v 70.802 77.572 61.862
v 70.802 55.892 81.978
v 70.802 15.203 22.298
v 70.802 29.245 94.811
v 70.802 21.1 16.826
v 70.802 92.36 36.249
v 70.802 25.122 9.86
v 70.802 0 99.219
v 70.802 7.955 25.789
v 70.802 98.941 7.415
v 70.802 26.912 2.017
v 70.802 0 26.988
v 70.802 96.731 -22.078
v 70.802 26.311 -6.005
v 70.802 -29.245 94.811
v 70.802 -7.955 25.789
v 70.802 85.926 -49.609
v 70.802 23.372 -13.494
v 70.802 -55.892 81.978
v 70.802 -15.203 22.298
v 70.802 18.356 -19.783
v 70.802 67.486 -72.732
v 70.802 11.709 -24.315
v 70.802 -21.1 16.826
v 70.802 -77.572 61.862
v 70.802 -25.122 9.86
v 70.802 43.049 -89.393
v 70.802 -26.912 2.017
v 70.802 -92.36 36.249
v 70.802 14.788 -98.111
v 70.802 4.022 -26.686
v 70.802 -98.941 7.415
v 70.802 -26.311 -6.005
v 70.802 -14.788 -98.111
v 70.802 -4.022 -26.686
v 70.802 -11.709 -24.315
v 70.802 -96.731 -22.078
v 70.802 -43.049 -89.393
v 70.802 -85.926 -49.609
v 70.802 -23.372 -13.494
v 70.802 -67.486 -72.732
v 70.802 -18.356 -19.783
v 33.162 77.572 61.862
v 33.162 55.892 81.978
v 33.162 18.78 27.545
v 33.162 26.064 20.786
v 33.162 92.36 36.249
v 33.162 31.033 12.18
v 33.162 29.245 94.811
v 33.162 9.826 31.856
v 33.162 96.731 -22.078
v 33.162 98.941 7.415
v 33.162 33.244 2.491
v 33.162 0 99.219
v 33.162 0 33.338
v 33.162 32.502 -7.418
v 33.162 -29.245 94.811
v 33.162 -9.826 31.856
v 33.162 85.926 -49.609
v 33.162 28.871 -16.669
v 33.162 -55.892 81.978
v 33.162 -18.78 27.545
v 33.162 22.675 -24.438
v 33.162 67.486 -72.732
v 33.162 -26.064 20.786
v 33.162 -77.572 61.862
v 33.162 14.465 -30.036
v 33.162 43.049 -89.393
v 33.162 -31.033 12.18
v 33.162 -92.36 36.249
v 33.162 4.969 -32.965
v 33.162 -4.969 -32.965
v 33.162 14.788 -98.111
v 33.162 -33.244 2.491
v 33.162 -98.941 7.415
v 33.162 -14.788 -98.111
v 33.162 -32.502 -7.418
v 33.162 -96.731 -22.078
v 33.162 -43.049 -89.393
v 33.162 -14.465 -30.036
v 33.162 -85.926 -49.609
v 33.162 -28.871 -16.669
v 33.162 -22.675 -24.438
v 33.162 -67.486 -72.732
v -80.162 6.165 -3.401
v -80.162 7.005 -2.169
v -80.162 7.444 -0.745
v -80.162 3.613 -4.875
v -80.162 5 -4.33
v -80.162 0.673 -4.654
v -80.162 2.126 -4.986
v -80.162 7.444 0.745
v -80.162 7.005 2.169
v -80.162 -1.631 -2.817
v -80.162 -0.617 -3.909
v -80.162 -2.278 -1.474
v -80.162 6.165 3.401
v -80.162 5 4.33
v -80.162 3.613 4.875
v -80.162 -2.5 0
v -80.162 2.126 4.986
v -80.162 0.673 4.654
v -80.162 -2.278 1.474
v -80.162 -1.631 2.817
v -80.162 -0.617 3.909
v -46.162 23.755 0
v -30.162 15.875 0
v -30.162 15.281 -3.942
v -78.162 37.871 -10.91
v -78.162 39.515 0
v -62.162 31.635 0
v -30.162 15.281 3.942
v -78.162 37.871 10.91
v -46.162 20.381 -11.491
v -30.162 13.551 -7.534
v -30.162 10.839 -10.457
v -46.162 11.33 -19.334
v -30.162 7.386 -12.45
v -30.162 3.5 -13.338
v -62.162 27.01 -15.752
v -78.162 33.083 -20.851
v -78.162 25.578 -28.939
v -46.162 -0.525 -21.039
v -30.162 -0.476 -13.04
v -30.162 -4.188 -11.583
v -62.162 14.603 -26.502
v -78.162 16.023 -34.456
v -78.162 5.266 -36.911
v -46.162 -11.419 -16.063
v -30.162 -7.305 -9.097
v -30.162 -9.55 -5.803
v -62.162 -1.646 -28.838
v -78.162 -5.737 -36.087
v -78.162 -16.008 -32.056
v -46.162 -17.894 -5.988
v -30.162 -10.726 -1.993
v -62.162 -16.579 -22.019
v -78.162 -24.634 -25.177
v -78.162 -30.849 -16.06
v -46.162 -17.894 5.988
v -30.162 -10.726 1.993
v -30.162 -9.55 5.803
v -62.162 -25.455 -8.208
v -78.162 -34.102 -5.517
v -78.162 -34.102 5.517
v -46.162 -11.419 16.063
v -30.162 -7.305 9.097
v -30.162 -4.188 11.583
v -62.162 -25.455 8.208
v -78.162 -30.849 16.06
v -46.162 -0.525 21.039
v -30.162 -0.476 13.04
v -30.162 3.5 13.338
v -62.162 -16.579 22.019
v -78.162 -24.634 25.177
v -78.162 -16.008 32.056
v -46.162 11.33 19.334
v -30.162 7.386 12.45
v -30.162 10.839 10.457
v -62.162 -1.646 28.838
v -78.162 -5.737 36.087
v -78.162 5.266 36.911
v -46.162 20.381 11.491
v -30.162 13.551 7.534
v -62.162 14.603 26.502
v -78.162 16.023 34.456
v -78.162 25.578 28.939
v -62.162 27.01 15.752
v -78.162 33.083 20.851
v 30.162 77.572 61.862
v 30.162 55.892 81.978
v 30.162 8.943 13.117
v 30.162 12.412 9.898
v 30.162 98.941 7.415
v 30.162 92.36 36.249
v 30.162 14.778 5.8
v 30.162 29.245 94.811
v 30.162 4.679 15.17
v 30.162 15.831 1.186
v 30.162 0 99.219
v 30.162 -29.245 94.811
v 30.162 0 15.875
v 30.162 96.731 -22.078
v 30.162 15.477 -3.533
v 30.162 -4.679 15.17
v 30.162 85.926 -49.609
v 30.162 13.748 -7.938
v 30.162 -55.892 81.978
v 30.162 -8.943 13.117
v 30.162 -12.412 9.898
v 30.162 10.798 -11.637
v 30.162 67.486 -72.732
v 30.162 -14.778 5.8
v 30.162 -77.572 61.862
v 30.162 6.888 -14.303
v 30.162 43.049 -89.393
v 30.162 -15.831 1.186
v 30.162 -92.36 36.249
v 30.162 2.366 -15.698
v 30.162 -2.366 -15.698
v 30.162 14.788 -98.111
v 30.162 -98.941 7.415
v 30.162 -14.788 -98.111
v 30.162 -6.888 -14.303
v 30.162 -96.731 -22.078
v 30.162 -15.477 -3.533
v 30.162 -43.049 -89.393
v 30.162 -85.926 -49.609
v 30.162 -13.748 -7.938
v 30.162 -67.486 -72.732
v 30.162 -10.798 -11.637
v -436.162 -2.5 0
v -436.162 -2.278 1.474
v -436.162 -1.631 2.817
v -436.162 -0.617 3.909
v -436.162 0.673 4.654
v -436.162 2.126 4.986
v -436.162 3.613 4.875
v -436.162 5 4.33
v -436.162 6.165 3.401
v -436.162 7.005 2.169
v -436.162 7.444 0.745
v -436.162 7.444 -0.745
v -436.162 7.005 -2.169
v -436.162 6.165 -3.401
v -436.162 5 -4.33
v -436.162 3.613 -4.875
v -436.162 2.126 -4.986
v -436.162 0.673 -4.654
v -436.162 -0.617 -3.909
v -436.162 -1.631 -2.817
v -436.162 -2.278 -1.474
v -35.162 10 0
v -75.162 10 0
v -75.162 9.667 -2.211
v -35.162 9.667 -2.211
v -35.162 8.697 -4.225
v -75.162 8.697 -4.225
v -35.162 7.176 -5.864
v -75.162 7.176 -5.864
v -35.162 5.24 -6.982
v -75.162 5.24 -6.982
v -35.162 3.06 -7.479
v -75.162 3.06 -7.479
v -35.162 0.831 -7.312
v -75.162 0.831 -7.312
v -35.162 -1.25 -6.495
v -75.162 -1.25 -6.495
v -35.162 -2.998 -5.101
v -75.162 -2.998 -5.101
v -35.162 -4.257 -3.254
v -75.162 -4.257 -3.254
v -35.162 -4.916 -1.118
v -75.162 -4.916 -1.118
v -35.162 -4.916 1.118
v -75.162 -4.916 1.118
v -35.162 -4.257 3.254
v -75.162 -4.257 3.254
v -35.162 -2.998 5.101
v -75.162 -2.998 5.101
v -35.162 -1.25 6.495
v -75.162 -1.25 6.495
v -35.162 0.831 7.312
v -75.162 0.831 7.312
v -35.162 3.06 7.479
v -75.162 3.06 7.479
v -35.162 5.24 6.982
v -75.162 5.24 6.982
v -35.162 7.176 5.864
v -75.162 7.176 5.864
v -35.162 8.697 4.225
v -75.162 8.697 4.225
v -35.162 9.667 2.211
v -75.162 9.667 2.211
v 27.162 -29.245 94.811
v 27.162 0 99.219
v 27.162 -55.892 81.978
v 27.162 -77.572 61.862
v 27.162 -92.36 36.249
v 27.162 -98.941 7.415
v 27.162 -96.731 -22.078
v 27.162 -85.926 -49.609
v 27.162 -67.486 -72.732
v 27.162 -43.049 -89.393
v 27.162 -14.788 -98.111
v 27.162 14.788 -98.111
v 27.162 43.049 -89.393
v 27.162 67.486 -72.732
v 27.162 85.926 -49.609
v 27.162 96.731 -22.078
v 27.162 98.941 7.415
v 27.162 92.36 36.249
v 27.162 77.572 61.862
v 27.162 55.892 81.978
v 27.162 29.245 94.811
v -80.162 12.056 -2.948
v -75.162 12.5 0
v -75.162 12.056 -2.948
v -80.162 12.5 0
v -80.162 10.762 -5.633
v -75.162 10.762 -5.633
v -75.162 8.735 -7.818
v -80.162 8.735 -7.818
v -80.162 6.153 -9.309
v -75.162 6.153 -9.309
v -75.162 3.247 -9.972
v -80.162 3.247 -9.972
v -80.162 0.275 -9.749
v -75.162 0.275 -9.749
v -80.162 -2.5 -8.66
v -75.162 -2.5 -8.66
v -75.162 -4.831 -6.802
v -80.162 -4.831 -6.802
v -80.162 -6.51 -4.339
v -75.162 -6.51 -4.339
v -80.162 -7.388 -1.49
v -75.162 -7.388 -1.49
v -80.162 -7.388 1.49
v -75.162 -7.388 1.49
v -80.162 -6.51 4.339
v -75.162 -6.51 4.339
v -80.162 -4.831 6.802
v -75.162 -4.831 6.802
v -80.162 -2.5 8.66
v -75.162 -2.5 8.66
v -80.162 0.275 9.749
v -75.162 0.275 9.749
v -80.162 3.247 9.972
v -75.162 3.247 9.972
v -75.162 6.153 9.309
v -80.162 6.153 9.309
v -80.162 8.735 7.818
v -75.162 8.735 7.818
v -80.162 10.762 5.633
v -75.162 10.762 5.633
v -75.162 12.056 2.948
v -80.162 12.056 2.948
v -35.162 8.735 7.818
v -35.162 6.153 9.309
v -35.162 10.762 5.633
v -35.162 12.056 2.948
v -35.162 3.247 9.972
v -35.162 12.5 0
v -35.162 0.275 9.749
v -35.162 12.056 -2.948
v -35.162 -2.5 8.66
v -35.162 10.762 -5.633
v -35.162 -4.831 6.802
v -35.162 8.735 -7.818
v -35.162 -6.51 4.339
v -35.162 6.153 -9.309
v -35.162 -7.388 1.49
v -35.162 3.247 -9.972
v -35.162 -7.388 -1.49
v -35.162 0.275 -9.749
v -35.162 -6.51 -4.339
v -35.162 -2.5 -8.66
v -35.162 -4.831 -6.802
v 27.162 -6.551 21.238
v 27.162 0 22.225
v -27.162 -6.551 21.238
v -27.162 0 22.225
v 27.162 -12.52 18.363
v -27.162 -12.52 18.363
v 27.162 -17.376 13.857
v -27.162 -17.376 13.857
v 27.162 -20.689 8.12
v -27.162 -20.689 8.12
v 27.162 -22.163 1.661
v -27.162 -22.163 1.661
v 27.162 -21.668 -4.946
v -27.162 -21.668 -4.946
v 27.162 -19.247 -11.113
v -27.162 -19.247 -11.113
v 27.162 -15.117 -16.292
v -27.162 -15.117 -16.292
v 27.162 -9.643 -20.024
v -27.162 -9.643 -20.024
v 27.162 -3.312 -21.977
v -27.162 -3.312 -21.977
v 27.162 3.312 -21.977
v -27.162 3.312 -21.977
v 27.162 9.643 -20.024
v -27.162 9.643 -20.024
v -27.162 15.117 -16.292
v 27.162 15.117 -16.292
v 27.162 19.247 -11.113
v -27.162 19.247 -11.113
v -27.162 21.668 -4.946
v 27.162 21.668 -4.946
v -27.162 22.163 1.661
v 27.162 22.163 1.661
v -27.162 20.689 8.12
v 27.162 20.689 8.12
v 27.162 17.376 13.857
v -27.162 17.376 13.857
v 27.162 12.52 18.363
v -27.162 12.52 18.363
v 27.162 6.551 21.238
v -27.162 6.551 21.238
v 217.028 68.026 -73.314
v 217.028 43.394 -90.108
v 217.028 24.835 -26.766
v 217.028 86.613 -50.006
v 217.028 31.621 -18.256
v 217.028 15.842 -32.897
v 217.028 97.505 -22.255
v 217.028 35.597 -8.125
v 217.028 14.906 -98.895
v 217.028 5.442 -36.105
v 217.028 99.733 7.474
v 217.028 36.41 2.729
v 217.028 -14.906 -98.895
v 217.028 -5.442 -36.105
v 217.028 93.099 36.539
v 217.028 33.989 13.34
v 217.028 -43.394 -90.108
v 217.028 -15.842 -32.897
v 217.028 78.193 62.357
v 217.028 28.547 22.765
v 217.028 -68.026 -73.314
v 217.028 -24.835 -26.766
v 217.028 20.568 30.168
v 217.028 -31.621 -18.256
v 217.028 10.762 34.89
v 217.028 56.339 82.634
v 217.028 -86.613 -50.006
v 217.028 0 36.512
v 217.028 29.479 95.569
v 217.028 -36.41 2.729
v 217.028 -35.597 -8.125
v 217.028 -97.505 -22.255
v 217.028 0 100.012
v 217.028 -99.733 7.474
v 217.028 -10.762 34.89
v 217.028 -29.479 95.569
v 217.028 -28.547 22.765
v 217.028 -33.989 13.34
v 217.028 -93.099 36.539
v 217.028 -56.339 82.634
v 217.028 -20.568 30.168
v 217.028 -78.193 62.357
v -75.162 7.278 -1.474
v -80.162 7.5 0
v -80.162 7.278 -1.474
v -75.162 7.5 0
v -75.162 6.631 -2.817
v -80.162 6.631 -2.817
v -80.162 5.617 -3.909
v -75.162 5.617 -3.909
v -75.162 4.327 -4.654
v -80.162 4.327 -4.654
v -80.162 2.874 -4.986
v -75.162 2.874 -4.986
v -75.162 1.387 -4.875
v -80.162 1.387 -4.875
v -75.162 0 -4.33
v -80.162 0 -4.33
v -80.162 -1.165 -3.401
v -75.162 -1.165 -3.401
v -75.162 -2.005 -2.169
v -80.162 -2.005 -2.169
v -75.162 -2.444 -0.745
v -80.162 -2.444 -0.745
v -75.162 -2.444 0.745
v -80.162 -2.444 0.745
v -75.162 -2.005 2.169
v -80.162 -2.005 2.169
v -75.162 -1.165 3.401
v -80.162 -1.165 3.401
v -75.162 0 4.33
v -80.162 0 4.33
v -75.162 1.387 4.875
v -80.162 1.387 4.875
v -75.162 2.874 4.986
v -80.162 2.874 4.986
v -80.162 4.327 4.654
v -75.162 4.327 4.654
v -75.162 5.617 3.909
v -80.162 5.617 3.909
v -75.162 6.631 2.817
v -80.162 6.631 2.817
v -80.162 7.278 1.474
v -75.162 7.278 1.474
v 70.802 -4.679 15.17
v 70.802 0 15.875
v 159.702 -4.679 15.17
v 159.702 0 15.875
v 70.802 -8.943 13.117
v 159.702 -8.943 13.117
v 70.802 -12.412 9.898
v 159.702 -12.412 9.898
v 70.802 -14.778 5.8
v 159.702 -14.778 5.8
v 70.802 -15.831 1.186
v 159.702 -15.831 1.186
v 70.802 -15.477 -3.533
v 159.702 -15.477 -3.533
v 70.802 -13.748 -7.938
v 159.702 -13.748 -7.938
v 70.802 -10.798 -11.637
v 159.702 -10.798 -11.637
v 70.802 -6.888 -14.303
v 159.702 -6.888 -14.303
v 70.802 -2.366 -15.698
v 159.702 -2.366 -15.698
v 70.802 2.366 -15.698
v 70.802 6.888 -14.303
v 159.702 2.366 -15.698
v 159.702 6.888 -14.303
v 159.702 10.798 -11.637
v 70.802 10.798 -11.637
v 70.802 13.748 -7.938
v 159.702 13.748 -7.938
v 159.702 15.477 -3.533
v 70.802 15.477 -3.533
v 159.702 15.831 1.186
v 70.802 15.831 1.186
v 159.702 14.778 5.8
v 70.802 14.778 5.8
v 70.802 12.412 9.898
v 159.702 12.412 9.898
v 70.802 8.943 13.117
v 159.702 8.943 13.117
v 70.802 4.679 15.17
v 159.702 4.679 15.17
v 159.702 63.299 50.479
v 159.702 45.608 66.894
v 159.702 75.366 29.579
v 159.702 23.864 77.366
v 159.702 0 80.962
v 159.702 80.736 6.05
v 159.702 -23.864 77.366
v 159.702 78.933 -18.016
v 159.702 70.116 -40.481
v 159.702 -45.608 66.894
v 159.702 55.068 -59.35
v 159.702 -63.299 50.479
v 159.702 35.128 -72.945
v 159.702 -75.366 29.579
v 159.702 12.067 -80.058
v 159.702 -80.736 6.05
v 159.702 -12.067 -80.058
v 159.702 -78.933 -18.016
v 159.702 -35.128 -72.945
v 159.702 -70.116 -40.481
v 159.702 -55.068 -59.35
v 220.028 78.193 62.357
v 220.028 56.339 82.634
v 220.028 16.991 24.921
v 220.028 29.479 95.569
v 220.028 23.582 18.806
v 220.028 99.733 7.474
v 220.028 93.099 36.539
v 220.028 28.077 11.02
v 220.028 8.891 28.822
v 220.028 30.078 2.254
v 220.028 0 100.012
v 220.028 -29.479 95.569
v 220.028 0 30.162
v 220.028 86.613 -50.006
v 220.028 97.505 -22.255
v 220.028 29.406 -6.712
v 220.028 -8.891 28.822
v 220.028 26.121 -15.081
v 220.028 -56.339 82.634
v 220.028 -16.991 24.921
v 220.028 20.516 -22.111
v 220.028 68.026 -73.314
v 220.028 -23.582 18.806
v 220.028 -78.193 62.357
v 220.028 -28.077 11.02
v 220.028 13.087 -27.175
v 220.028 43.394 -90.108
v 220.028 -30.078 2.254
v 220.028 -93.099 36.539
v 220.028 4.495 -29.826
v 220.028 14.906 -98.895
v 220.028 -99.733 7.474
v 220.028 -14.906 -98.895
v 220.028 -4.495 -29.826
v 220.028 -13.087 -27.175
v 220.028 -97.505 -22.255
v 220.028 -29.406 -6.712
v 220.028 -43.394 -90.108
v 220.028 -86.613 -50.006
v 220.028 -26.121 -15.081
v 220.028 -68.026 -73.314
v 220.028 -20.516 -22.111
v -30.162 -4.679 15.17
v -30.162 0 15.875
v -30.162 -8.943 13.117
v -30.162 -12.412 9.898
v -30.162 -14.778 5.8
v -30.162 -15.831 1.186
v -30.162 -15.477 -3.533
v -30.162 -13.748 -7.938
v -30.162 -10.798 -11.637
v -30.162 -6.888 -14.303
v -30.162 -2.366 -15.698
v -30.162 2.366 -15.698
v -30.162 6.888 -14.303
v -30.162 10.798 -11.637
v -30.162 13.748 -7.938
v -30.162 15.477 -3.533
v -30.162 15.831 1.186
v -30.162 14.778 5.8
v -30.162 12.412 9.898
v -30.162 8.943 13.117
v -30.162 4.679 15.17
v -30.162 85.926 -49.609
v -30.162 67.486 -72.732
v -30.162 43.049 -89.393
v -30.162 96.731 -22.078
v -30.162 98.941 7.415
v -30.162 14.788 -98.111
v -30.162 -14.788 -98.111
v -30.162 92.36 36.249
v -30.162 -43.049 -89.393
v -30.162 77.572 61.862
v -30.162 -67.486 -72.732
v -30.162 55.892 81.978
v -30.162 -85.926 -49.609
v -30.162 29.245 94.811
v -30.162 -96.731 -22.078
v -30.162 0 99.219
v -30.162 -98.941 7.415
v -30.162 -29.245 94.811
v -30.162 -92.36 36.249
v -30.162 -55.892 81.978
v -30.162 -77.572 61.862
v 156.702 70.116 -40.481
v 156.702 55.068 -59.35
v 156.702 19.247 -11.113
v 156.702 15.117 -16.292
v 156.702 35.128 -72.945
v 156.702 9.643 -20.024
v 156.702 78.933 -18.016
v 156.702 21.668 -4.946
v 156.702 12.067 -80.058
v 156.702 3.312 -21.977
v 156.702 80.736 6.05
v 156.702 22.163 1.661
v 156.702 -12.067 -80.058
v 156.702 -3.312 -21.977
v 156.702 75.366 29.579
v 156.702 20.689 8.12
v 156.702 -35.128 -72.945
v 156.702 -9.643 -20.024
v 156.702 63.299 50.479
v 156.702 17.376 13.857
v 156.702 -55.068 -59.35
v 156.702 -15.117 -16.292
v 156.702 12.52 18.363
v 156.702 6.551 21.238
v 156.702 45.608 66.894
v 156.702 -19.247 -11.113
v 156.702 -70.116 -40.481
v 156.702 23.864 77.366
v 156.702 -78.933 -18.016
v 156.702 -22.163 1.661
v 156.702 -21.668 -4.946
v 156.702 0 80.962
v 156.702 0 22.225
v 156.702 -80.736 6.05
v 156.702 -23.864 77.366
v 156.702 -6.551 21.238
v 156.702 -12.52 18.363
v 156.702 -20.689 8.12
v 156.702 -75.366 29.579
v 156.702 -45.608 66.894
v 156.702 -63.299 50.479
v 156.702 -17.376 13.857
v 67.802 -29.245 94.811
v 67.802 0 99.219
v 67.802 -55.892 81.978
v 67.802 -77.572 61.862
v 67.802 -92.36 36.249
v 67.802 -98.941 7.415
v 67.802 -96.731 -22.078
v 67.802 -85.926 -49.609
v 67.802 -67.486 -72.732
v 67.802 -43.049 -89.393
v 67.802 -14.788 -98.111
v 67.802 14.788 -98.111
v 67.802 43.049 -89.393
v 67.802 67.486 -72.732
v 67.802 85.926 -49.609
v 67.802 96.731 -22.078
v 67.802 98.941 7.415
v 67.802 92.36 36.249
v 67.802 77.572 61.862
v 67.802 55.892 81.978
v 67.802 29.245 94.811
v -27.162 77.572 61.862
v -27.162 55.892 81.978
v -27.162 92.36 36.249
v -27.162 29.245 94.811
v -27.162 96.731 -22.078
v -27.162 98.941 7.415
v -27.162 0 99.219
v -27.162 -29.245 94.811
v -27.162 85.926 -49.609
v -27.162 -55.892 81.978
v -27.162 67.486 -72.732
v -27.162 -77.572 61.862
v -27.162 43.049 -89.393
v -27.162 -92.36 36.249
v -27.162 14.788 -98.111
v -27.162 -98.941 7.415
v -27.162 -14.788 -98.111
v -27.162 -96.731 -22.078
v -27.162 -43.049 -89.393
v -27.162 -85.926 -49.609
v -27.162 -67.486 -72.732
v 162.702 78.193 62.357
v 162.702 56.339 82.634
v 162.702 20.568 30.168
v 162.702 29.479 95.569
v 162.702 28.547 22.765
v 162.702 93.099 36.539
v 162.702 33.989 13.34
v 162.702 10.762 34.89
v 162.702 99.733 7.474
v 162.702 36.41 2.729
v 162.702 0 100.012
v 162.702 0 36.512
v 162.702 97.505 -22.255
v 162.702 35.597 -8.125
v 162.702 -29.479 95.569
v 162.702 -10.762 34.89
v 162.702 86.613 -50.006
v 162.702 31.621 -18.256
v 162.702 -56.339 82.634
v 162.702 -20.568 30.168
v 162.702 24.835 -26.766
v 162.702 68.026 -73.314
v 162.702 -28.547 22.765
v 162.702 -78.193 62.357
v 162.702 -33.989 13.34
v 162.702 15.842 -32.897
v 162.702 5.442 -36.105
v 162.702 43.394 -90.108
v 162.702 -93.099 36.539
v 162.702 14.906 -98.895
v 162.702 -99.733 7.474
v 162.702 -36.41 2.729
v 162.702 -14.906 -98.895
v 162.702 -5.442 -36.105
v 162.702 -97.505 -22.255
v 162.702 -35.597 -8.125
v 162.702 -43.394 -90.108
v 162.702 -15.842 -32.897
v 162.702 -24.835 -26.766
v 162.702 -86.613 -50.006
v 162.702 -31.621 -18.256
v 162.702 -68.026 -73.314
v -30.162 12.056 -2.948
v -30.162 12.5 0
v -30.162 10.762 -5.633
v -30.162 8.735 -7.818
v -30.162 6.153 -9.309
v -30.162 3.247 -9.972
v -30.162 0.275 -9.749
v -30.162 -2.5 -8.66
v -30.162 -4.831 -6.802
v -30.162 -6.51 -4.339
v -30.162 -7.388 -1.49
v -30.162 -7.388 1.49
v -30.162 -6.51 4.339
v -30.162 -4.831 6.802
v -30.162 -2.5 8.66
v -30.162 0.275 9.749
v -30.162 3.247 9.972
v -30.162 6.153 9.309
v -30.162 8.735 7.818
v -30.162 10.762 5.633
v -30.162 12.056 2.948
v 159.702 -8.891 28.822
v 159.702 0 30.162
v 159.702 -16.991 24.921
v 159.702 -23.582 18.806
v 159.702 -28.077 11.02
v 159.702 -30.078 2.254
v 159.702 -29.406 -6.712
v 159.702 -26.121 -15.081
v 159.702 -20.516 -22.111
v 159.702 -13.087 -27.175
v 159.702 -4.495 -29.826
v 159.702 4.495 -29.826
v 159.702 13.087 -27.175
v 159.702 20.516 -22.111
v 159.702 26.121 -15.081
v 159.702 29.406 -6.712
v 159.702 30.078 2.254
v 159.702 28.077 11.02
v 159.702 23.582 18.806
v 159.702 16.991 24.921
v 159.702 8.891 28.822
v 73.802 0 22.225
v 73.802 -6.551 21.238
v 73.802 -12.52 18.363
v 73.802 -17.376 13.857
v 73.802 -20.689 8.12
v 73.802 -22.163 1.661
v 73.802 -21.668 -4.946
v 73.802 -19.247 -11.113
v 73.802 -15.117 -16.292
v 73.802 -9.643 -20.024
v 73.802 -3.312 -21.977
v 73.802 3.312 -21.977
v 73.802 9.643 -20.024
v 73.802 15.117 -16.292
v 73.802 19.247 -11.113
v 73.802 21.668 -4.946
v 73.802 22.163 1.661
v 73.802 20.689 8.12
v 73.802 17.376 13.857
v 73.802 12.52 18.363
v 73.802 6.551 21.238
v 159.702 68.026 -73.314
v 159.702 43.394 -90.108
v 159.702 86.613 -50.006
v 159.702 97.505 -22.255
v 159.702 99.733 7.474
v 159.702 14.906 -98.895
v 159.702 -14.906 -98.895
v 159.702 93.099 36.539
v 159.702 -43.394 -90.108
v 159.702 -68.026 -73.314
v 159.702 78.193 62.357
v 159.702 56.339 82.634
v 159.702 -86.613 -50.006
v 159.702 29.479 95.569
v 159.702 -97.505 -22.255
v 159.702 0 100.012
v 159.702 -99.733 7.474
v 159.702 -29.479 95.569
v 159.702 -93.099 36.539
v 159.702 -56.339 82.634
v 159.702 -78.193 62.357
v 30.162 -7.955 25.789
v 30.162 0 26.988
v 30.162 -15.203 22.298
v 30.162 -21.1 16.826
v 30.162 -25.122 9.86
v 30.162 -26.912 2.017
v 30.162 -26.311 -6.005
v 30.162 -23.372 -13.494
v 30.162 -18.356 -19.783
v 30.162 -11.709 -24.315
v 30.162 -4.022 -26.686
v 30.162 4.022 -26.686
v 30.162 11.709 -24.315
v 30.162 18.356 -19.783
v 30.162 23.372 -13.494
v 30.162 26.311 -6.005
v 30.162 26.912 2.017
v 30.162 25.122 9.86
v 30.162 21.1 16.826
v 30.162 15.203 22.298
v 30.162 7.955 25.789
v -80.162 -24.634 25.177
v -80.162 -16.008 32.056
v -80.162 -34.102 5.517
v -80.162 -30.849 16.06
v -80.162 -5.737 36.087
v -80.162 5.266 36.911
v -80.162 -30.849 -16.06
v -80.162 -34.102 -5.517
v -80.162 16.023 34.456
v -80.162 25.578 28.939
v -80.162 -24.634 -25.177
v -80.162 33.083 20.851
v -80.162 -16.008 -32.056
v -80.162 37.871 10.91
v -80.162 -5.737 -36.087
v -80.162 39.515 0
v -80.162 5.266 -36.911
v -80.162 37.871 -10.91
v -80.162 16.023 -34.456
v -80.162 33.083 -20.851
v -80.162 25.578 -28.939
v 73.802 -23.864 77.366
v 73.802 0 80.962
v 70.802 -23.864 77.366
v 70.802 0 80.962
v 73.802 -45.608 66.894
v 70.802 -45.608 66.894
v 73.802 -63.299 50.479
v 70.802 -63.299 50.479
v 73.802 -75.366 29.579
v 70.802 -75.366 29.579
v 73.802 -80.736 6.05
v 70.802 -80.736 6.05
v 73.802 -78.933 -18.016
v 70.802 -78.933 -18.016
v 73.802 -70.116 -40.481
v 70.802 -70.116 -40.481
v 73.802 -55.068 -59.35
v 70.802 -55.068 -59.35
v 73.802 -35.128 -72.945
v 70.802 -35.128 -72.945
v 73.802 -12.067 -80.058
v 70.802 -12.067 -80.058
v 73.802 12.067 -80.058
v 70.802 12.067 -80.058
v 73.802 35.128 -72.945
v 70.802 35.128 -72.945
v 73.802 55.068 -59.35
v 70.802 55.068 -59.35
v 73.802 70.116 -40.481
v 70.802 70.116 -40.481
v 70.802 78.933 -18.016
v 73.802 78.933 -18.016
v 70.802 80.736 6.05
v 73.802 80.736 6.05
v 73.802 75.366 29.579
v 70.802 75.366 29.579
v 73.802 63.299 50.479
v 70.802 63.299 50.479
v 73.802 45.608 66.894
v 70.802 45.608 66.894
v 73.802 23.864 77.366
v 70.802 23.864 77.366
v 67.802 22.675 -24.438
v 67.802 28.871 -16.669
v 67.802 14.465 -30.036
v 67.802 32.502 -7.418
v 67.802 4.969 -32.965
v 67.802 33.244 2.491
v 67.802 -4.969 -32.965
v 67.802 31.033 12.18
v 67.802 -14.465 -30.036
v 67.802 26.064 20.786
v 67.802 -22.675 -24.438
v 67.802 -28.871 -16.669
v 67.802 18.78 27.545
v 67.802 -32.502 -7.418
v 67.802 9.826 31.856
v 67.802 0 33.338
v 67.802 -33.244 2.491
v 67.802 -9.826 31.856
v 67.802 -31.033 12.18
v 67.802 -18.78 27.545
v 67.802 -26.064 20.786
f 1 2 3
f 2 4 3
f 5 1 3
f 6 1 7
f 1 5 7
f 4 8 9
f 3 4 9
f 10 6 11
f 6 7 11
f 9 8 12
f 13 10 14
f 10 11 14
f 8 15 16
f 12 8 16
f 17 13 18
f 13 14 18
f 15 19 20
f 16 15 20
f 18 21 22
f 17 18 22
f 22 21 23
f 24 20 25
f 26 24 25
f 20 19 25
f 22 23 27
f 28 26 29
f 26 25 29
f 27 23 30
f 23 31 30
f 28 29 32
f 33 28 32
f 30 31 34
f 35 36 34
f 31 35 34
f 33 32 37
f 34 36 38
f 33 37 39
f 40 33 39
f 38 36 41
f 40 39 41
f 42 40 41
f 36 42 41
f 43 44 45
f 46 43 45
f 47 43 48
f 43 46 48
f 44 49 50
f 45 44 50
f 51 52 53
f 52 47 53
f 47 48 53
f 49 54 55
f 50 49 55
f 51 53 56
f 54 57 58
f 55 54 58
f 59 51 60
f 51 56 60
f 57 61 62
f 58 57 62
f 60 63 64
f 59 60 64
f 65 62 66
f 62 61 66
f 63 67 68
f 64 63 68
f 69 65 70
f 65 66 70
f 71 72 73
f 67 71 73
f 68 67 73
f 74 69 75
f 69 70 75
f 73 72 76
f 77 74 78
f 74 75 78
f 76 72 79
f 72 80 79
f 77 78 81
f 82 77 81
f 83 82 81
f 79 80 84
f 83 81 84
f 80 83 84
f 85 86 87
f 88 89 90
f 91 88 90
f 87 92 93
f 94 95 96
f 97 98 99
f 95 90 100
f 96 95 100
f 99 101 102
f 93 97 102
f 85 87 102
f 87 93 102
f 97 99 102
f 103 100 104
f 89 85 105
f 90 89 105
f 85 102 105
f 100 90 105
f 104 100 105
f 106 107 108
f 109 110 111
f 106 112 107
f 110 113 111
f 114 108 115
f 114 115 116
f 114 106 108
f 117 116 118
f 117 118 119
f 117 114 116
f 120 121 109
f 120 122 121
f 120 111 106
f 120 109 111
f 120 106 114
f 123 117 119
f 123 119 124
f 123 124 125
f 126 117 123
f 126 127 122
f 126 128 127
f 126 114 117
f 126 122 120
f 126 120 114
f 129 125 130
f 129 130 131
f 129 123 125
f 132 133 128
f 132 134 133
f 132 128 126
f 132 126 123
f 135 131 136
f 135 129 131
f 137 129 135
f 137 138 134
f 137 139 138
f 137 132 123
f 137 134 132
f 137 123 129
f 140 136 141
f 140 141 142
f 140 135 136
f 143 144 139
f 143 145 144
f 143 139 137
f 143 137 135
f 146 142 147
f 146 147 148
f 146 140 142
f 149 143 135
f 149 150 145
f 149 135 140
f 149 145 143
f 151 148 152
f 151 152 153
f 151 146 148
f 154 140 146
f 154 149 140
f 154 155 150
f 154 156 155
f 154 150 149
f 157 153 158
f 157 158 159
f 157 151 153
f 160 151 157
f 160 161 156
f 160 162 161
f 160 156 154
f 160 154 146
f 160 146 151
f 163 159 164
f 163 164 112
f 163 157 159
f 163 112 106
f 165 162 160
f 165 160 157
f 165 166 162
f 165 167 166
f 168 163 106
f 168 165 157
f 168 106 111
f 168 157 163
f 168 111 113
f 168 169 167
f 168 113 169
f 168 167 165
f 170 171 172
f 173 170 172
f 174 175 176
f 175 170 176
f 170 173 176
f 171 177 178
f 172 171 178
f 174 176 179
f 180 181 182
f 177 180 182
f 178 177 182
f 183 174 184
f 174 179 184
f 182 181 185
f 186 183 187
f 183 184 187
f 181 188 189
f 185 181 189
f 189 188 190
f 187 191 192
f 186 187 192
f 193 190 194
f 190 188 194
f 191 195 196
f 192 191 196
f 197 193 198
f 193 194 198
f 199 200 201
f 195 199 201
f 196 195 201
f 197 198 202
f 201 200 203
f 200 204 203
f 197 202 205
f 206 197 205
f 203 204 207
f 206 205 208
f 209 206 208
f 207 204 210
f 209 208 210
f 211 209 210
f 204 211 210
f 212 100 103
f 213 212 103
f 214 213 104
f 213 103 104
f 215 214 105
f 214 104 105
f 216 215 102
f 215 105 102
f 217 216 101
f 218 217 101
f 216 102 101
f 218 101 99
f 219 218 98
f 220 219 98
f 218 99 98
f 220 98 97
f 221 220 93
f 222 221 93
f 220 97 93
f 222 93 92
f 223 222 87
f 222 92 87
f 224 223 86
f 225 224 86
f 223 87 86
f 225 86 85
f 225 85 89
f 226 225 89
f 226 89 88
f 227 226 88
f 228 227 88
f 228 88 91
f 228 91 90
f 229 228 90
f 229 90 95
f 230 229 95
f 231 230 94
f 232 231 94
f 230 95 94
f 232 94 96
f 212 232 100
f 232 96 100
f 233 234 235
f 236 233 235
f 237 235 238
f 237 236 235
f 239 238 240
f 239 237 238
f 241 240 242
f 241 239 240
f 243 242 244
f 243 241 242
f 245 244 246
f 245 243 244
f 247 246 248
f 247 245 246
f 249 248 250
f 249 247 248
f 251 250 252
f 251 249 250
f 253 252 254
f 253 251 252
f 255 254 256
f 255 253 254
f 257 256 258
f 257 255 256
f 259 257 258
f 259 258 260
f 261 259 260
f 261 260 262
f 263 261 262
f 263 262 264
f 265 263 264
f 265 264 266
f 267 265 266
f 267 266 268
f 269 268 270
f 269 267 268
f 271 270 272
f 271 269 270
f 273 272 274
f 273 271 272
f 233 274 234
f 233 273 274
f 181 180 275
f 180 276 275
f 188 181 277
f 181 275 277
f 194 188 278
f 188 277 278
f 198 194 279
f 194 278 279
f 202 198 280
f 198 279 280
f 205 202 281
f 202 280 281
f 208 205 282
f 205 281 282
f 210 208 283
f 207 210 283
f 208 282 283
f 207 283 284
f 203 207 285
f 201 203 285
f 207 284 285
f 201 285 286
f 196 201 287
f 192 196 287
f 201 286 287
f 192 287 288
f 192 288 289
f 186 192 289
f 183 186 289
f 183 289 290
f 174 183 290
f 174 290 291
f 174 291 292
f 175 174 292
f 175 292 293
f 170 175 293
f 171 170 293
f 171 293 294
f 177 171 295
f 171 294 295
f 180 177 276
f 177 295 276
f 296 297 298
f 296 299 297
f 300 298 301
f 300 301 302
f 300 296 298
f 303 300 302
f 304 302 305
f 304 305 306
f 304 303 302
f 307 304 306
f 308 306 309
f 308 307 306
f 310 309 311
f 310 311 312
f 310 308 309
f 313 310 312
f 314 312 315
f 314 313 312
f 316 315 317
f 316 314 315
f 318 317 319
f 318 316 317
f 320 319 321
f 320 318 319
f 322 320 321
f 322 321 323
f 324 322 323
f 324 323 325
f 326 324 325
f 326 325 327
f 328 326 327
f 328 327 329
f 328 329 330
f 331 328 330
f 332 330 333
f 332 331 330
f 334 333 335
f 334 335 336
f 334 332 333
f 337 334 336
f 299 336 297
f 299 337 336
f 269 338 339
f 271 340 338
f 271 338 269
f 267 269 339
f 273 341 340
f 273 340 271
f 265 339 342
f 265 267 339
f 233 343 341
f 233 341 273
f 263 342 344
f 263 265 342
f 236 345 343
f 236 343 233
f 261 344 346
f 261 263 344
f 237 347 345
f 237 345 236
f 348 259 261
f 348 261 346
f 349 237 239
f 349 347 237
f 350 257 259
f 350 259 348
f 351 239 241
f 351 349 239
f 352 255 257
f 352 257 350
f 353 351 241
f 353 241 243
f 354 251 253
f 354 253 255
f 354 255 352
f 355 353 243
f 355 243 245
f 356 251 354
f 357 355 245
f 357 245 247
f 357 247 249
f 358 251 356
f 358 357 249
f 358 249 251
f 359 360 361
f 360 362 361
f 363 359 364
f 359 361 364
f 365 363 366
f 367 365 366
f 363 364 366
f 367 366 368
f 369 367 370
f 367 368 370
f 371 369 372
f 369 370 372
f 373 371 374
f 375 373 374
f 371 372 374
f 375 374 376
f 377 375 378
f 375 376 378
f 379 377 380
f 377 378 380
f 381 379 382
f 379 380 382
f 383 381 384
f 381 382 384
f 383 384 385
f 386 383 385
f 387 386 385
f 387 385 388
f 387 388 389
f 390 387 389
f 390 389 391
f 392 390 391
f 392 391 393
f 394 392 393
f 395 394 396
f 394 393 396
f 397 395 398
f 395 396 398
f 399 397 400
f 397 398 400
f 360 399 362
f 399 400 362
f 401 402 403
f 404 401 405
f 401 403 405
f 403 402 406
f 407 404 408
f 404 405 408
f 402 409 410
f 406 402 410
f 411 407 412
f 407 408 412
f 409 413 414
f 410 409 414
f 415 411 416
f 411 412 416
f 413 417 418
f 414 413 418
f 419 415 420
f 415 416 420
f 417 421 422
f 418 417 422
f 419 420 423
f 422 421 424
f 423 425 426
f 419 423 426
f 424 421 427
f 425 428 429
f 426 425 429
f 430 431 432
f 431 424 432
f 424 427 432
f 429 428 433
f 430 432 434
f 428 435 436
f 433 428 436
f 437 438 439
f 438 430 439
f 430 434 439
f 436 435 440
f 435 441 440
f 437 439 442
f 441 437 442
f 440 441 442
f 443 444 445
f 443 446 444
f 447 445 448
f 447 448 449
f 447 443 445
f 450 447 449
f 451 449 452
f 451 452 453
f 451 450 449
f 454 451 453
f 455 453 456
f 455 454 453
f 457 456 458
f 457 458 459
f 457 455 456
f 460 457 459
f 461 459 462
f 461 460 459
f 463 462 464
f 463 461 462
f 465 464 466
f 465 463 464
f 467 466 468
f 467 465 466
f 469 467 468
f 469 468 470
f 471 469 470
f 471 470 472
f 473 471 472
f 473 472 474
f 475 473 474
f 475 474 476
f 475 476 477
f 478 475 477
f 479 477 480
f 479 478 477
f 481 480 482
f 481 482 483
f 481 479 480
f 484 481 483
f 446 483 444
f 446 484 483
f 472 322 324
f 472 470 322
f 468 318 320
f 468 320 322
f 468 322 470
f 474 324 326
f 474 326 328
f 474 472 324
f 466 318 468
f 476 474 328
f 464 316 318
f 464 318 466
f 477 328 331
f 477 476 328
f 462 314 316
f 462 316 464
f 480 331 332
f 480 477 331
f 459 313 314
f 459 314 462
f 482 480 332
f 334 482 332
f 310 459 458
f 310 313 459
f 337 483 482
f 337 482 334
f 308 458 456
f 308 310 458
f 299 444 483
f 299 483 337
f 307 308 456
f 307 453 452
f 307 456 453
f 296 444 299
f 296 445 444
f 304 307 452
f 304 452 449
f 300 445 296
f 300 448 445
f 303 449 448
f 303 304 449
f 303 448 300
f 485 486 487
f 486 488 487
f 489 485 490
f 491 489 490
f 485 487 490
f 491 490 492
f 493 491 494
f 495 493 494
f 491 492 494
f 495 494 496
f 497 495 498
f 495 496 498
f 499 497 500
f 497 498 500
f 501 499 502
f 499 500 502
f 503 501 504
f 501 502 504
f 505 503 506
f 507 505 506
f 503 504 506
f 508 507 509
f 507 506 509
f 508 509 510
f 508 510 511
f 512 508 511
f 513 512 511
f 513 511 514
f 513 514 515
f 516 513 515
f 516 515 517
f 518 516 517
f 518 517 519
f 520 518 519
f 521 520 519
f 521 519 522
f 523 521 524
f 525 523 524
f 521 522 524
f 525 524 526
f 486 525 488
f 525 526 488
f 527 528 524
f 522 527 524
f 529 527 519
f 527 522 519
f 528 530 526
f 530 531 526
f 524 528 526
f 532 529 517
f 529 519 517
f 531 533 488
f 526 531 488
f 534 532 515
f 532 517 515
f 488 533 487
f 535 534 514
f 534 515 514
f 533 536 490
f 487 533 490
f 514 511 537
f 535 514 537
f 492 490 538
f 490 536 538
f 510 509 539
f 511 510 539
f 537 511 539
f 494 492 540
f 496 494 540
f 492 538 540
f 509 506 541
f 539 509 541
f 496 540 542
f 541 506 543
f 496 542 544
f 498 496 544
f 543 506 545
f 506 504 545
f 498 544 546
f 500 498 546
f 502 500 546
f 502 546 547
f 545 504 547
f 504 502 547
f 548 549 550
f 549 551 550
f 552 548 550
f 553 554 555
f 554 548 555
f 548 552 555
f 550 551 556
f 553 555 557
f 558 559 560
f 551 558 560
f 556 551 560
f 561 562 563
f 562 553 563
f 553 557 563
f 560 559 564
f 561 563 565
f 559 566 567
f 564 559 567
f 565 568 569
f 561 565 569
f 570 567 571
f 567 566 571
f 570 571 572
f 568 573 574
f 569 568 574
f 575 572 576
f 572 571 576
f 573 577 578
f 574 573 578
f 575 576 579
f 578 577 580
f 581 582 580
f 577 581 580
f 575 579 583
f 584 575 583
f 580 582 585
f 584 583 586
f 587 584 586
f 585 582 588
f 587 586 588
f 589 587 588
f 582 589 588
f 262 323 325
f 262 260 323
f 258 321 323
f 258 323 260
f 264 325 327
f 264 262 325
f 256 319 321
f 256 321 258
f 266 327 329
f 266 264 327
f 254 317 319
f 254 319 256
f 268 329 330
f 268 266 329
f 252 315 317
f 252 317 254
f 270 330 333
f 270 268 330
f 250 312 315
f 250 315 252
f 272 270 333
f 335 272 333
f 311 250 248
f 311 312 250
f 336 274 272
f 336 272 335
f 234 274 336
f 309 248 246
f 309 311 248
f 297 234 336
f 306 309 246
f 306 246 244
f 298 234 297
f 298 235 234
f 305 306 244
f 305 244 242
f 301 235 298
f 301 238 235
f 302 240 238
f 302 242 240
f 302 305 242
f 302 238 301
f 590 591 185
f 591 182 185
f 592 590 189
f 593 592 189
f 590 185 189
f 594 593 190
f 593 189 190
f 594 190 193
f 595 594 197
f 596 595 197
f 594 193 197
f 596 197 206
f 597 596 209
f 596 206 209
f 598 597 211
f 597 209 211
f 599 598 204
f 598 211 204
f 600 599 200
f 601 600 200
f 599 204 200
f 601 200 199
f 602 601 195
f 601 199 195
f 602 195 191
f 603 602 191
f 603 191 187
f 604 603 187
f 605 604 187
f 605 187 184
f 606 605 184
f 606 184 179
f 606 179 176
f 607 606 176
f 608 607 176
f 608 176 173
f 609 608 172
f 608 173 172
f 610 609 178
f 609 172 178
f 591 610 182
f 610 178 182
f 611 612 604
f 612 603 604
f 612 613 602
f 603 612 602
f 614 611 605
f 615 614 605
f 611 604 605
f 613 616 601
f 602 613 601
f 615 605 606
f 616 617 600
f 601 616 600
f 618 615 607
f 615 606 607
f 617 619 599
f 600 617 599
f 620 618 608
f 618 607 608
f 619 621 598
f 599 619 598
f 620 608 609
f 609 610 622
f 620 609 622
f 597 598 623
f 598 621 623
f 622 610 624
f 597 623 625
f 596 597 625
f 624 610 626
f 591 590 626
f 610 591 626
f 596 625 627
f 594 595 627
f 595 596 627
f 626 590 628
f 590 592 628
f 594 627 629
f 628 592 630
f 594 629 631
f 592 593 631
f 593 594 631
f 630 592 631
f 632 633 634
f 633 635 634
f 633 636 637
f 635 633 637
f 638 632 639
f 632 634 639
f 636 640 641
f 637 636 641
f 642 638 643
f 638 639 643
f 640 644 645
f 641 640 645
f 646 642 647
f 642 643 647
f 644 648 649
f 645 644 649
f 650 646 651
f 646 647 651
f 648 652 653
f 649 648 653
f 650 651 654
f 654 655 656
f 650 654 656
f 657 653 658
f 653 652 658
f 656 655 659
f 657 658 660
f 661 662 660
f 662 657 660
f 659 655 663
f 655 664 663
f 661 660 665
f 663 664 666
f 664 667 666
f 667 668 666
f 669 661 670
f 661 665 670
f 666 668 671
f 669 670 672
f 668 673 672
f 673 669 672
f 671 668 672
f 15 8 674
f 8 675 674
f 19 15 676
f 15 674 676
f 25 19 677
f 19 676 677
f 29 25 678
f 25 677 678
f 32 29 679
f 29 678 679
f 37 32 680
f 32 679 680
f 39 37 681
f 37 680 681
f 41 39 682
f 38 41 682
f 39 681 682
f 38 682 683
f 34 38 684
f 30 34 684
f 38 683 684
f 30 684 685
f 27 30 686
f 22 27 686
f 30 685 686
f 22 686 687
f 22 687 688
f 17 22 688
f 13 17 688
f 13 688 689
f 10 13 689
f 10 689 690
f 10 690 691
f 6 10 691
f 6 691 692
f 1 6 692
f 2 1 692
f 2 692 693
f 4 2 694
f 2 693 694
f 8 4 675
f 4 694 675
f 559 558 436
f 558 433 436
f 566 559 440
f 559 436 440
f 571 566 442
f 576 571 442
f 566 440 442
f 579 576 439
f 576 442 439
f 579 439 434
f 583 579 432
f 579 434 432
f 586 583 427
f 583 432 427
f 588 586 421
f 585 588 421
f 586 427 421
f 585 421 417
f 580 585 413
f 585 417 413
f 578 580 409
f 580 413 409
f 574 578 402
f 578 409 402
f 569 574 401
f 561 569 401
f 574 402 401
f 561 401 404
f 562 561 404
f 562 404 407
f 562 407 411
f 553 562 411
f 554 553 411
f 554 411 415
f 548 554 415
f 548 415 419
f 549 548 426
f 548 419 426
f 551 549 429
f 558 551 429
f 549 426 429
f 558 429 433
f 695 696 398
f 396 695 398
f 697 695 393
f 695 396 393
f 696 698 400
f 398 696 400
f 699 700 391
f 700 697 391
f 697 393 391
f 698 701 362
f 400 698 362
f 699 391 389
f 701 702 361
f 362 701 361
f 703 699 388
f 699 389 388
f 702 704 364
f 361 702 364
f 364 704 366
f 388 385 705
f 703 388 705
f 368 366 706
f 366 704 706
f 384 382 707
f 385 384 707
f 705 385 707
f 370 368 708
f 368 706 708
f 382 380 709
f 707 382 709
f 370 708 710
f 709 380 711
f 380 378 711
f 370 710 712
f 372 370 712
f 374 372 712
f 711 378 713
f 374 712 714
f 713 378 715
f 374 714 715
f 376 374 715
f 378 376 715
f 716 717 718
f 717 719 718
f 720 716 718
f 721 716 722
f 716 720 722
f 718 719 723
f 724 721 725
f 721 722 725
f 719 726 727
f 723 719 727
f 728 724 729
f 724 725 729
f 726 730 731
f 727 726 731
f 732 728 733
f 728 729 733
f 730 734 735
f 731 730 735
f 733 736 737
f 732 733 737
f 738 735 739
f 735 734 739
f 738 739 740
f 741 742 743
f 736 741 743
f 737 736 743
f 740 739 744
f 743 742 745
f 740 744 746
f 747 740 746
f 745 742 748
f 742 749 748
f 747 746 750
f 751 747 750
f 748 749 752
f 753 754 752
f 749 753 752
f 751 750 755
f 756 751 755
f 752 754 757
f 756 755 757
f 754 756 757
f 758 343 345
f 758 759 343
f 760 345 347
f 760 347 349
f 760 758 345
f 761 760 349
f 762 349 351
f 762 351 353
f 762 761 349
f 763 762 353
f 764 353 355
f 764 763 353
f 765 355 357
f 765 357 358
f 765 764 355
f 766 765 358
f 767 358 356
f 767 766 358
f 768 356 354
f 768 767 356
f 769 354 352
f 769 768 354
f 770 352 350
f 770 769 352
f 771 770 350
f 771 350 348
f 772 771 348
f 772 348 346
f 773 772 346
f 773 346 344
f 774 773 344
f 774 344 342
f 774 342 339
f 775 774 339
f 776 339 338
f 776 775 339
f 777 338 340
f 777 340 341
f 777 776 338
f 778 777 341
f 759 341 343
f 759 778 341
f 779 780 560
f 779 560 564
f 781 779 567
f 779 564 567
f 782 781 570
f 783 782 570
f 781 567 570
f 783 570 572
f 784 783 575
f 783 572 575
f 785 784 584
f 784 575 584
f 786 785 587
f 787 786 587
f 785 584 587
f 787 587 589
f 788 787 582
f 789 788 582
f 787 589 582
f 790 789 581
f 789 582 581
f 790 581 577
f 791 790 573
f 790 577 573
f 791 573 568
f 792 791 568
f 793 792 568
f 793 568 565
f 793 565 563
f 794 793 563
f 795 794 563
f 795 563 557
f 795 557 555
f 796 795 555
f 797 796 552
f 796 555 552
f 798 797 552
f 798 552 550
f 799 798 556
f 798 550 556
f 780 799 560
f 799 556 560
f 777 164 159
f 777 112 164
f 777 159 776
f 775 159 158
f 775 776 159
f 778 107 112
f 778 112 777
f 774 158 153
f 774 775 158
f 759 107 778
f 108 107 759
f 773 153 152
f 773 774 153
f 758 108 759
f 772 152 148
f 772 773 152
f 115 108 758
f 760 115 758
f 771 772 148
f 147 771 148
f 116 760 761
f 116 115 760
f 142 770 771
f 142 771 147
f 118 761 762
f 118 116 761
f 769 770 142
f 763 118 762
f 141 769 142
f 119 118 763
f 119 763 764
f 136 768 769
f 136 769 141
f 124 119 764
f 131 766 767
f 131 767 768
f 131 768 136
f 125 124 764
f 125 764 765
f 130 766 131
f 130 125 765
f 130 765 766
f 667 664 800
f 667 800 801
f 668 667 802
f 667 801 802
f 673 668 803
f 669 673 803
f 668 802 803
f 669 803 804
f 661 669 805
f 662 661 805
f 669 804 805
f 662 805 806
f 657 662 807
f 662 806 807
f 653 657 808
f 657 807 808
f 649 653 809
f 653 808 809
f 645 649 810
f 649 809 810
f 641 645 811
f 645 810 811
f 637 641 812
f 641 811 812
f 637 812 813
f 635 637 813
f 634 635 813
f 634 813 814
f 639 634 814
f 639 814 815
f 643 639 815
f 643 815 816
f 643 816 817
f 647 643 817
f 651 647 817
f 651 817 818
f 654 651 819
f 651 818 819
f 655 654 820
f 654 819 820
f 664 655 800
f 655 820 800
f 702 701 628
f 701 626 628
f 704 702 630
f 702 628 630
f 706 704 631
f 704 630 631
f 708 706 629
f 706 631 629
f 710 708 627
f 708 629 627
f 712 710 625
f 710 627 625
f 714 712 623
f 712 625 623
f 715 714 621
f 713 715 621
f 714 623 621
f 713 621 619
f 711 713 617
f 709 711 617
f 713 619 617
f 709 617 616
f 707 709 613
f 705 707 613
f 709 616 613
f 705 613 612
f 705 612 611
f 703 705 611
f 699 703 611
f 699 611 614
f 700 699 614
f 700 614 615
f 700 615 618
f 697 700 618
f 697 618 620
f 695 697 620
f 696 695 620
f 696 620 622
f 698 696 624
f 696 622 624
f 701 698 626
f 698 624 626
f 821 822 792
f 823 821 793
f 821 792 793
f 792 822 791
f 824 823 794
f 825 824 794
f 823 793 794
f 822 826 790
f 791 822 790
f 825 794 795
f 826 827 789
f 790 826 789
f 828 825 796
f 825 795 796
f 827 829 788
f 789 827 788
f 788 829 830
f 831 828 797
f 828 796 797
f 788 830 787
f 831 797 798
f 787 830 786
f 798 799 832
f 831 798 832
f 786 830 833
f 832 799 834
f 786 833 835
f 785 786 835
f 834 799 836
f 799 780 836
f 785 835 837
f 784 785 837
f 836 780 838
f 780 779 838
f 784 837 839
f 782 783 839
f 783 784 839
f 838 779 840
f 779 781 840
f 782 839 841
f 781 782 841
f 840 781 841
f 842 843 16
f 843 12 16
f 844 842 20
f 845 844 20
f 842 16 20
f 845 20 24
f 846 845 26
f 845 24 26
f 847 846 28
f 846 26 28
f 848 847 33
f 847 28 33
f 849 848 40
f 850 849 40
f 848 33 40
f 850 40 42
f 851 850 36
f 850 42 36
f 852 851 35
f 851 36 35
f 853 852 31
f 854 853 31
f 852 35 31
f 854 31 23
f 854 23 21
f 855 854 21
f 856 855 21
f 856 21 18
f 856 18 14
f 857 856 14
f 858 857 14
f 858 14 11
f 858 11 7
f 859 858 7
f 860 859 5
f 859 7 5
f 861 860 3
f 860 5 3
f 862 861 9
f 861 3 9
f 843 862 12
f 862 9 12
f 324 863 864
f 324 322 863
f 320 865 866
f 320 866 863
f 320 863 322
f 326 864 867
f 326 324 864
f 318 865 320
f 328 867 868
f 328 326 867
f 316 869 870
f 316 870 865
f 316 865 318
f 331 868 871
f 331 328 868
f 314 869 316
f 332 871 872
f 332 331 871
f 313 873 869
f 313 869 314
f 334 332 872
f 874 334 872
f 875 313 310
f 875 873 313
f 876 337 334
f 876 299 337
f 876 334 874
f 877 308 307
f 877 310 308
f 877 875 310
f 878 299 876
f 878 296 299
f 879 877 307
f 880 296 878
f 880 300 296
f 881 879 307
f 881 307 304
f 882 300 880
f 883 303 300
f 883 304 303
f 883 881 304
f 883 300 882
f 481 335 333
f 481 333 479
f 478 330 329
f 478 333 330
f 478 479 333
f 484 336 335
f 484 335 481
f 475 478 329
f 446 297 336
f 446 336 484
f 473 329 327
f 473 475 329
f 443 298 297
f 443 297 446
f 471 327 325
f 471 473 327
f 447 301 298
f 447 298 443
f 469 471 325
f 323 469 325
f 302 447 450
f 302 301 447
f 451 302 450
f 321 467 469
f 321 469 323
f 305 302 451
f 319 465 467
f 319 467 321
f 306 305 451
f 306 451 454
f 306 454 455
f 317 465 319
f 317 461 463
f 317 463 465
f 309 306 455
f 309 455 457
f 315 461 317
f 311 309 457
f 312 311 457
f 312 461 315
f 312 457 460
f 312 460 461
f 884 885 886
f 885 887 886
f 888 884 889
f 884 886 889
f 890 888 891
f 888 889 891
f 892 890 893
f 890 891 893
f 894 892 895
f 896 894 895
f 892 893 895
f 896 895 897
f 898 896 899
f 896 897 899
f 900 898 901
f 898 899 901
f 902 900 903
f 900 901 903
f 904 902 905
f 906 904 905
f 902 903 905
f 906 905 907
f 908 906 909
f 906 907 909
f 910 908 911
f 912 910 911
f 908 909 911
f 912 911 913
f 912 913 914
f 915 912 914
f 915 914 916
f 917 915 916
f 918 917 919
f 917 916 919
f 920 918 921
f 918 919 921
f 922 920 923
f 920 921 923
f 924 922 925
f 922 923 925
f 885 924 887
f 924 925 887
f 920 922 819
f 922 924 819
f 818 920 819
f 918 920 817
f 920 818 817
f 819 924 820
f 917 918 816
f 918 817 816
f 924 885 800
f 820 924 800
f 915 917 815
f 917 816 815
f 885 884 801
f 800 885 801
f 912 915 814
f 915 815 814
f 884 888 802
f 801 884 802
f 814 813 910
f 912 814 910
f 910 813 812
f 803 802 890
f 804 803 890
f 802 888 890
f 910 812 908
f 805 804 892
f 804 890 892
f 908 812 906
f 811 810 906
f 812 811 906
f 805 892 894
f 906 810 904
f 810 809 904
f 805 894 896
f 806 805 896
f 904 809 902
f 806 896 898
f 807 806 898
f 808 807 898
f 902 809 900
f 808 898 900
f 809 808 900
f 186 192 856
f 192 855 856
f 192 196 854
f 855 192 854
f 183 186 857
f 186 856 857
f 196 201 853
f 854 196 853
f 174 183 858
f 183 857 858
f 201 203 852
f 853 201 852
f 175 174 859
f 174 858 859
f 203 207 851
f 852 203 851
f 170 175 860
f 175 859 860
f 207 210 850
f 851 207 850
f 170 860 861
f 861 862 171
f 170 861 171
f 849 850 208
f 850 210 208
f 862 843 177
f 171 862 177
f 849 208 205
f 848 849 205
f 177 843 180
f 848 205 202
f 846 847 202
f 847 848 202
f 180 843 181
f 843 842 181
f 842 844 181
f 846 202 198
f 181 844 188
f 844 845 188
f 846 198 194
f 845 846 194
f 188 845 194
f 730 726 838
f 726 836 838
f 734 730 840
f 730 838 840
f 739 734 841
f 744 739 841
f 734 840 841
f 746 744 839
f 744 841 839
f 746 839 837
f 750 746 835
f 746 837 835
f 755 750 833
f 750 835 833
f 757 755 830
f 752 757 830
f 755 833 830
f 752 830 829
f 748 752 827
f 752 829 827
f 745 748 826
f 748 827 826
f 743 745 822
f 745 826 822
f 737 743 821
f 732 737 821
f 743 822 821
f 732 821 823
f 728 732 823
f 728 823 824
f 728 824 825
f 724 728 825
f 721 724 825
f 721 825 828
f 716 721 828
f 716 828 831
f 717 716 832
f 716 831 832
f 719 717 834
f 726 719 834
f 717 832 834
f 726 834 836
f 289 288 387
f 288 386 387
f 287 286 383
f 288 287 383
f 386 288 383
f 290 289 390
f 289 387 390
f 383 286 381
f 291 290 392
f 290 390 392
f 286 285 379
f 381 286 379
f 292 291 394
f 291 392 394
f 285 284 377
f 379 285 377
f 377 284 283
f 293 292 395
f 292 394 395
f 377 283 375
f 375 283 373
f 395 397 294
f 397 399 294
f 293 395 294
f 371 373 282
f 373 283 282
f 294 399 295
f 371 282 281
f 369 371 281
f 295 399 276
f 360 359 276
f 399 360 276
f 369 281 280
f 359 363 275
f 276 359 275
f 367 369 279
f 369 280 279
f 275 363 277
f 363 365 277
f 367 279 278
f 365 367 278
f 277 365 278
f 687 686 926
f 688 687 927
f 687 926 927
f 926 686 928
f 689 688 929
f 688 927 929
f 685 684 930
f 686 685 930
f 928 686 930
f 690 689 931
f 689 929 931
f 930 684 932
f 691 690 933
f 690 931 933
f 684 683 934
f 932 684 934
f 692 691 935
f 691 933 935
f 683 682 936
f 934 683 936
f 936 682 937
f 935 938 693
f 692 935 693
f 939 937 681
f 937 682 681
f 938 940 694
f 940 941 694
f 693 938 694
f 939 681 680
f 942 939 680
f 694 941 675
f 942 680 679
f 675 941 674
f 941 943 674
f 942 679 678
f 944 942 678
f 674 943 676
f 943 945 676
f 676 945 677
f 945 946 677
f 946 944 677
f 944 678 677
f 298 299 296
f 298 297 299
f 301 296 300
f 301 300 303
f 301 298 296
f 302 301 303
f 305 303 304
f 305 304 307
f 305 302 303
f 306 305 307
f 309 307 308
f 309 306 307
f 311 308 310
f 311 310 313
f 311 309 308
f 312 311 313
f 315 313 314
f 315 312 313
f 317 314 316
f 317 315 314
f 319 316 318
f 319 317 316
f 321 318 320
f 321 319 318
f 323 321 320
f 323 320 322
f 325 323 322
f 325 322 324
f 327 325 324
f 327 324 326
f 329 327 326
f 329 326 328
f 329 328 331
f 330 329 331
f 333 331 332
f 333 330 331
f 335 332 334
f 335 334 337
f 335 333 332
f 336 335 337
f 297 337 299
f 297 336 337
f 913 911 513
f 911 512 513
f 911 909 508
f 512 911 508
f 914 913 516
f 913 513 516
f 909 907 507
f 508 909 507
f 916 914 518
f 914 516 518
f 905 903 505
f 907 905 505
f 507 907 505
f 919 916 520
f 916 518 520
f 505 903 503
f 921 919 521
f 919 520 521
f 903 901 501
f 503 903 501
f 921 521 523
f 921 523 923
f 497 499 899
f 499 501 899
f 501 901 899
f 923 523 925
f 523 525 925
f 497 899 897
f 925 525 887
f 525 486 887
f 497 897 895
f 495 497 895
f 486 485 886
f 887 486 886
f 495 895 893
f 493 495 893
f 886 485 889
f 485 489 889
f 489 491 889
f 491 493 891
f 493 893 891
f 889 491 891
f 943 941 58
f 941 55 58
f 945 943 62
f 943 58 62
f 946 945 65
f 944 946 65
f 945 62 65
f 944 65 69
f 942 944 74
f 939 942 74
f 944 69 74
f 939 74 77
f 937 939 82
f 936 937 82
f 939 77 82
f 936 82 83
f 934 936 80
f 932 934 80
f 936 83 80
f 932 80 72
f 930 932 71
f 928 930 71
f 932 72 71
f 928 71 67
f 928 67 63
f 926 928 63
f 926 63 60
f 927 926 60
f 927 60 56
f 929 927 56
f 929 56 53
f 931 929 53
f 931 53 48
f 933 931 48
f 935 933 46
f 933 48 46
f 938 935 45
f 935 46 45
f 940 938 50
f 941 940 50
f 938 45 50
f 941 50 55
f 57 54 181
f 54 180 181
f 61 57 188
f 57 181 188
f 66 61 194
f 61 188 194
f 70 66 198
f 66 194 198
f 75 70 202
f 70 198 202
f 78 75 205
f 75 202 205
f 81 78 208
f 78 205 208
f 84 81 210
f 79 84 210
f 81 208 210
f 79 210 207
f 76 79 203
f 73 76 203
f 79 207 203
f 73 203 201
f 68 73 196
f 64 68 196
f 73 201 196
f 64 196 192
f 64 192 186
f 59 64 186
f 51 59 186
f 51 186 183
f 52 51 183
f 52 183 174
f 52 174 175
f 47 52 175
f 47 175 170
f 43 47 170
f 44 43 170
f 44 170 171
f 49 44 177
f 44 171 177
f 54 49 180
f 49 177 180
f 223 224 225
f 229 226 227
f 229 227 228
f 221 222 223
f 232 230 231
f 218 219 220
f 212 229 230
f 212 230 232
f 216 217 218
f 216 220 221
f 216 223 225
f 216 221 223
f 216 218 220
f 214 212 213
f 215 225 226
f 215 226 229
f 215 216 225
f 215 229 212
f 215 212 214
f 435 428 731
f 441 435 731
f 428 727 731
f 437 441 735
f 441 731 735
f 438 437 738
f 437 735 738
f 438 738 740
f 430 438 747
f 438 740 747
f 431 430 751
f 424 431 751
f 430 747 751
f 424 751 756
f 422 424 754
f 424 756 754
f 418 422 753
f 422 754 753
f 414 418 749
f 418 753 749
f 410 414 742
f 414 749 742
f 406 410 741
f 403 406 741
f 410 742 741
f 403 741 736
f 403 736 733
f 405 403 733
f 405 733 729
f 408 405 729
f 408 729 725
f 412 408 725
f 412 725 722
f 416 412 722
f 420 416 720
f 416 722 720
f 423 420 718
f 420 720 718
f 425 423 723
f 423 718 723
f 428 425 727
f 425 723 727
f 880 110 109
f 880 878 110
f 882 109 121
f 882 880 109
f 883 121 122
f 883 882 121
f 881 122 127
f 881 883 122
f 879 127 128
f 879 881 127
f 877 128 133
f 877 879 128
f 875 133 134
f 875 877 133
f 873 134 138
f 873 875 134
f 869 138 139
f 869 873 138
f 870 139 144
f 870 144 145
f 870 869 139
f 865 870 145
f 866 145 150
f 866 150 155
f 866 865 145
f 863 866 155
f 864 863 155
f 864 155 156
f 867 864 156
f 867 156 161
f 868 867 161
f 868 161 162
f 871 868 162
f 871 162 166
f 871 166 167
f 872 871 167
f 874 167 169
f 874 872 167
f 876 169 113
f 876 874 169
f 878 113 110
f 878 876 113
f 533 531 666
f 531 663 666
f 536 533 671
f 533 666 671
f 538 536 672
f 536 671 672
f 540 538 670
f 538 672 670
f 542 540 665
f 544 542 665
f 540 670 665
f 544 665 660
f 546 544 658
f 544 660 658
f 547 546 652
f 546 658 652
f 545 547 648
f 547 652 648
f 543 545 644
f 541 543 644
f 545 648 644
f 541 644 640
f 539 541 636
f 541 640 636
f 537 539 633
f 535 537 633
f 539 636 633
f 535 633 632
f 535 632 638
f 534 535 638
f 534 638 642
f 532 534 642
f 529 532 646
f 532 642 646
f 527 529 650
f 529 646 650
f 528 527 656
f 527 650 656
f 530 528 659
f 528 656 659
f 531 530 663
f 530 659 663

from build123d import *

# Parameters (mm, degrees)
F11_R     = 5
F12_DEPTH = 356


with BuildPart() as f1:
    # F0 (on Front) → F1 (revolve)
    with BuildSketch(Plane.XZ):
        Polygon((-27.1625, 99.21875), (-30.1625, 99.21875), (-30.1625, 15.875), (30.1625, 15.875), (30.1625, 99.21875), (27.1625, 99.21875), (27.1625, 22.225), (-27.1625, 22.225), align=None)
    revolve(axis=Axis((0, 0, 0), (1, 0, 0)))


with BuildPart() as f3:
    # F2 (on Front) → F3 (revolve)
    with BuildSketch(Plane.XZ):
        Polygon((33.1625, 99.21875), (30.1625, 99.21875), (30.1625, 26.9875), (70.8025, 26.9875), (70.8025, 99.21875), (67.8025, 99.21875), (67.8025, 33.3375), (33.1625, 33.3375), align=None)
    revolve(axis=Axis((50.4825, 0, 0), (1, 0, 0)))


with BuildPart() as f5:
    # F4 (on Front) → F5 (revolve)
    with BuildSketch(Plane.XZ):
        Polygon((73.8025, 80.9625), (70.8025, 80.9625), (70.8025, 15.875), (159.7025, 15.875), (159.7025, 80.9625), (156.7025, 80.9625), (156.7025, 22.225), (73.8025, 22.225), align=None)
    revolve(axis=Axis((115.2525, 0, 0), (1, 0, 0)))


with BuildPart() as f7:
    # F6 (on Front) → F7 (revolve)
    with BuildSketch(Plane.XZ):
        Polygon((162.7025, 100.0125), (159.7025, 100.0125), (159.7025, 30.1625), (220.0275, 30.1625), (220.0275, 100.0125), (217.0275, 100.0125), (217.0275, 36.5125), (162.7025, 36.5125), align=None)
    revolve(axis=Axis((189.865, 0, 0), (1, 0, 0)))


with BuildPart() as f9:
    # F8 (on Top) → F9 (revolve)
    with BuildSketch(Plane.XY):
        Polygon((-75.1625, 12.5), (-80.1625, 12.5), (-80.1625, 7.5), (-75.1625, 7.5), (-75.1625, 10), align=None)
    revolve(axis=Axis((-55.1625, 2.5, 0), (-1, 0, 0)))


with BuildPart() as f10:
    # F8 (on Top) → F10 (revolve)
    with BuildSketch(Plane.XY):
        Polygon((-78.1625, 39.515), (-80.1625, 39.515), (-80.1625, 12.5), (-75.1625, 12.5), (-75.1625, 10), (-35.1625, 10), (-35.1625, 12.5), (-30.1625, 12.5), (-30.1625, 15.875), align=None)
    revolve(axis=Axis((-55.1625, 2.5, 0), (-1, 0, 0)))


with BuildPart() as f12:
    # F11 (on face) → F12 (new body)
    with BuildSketch(Plane(origin=(-80.1625, 0, 0), x_dir=(0, -1, 0), z_dir=(-1, 0, 0))):
        with Locations((-2.5, 0)):
            Circle(F11_R)
    extrude(amount=F12_DEPTH)


solid = Compound([f1.part, f3.part, f5.part, f7.part, f9.part, f10.part, f12.part])
